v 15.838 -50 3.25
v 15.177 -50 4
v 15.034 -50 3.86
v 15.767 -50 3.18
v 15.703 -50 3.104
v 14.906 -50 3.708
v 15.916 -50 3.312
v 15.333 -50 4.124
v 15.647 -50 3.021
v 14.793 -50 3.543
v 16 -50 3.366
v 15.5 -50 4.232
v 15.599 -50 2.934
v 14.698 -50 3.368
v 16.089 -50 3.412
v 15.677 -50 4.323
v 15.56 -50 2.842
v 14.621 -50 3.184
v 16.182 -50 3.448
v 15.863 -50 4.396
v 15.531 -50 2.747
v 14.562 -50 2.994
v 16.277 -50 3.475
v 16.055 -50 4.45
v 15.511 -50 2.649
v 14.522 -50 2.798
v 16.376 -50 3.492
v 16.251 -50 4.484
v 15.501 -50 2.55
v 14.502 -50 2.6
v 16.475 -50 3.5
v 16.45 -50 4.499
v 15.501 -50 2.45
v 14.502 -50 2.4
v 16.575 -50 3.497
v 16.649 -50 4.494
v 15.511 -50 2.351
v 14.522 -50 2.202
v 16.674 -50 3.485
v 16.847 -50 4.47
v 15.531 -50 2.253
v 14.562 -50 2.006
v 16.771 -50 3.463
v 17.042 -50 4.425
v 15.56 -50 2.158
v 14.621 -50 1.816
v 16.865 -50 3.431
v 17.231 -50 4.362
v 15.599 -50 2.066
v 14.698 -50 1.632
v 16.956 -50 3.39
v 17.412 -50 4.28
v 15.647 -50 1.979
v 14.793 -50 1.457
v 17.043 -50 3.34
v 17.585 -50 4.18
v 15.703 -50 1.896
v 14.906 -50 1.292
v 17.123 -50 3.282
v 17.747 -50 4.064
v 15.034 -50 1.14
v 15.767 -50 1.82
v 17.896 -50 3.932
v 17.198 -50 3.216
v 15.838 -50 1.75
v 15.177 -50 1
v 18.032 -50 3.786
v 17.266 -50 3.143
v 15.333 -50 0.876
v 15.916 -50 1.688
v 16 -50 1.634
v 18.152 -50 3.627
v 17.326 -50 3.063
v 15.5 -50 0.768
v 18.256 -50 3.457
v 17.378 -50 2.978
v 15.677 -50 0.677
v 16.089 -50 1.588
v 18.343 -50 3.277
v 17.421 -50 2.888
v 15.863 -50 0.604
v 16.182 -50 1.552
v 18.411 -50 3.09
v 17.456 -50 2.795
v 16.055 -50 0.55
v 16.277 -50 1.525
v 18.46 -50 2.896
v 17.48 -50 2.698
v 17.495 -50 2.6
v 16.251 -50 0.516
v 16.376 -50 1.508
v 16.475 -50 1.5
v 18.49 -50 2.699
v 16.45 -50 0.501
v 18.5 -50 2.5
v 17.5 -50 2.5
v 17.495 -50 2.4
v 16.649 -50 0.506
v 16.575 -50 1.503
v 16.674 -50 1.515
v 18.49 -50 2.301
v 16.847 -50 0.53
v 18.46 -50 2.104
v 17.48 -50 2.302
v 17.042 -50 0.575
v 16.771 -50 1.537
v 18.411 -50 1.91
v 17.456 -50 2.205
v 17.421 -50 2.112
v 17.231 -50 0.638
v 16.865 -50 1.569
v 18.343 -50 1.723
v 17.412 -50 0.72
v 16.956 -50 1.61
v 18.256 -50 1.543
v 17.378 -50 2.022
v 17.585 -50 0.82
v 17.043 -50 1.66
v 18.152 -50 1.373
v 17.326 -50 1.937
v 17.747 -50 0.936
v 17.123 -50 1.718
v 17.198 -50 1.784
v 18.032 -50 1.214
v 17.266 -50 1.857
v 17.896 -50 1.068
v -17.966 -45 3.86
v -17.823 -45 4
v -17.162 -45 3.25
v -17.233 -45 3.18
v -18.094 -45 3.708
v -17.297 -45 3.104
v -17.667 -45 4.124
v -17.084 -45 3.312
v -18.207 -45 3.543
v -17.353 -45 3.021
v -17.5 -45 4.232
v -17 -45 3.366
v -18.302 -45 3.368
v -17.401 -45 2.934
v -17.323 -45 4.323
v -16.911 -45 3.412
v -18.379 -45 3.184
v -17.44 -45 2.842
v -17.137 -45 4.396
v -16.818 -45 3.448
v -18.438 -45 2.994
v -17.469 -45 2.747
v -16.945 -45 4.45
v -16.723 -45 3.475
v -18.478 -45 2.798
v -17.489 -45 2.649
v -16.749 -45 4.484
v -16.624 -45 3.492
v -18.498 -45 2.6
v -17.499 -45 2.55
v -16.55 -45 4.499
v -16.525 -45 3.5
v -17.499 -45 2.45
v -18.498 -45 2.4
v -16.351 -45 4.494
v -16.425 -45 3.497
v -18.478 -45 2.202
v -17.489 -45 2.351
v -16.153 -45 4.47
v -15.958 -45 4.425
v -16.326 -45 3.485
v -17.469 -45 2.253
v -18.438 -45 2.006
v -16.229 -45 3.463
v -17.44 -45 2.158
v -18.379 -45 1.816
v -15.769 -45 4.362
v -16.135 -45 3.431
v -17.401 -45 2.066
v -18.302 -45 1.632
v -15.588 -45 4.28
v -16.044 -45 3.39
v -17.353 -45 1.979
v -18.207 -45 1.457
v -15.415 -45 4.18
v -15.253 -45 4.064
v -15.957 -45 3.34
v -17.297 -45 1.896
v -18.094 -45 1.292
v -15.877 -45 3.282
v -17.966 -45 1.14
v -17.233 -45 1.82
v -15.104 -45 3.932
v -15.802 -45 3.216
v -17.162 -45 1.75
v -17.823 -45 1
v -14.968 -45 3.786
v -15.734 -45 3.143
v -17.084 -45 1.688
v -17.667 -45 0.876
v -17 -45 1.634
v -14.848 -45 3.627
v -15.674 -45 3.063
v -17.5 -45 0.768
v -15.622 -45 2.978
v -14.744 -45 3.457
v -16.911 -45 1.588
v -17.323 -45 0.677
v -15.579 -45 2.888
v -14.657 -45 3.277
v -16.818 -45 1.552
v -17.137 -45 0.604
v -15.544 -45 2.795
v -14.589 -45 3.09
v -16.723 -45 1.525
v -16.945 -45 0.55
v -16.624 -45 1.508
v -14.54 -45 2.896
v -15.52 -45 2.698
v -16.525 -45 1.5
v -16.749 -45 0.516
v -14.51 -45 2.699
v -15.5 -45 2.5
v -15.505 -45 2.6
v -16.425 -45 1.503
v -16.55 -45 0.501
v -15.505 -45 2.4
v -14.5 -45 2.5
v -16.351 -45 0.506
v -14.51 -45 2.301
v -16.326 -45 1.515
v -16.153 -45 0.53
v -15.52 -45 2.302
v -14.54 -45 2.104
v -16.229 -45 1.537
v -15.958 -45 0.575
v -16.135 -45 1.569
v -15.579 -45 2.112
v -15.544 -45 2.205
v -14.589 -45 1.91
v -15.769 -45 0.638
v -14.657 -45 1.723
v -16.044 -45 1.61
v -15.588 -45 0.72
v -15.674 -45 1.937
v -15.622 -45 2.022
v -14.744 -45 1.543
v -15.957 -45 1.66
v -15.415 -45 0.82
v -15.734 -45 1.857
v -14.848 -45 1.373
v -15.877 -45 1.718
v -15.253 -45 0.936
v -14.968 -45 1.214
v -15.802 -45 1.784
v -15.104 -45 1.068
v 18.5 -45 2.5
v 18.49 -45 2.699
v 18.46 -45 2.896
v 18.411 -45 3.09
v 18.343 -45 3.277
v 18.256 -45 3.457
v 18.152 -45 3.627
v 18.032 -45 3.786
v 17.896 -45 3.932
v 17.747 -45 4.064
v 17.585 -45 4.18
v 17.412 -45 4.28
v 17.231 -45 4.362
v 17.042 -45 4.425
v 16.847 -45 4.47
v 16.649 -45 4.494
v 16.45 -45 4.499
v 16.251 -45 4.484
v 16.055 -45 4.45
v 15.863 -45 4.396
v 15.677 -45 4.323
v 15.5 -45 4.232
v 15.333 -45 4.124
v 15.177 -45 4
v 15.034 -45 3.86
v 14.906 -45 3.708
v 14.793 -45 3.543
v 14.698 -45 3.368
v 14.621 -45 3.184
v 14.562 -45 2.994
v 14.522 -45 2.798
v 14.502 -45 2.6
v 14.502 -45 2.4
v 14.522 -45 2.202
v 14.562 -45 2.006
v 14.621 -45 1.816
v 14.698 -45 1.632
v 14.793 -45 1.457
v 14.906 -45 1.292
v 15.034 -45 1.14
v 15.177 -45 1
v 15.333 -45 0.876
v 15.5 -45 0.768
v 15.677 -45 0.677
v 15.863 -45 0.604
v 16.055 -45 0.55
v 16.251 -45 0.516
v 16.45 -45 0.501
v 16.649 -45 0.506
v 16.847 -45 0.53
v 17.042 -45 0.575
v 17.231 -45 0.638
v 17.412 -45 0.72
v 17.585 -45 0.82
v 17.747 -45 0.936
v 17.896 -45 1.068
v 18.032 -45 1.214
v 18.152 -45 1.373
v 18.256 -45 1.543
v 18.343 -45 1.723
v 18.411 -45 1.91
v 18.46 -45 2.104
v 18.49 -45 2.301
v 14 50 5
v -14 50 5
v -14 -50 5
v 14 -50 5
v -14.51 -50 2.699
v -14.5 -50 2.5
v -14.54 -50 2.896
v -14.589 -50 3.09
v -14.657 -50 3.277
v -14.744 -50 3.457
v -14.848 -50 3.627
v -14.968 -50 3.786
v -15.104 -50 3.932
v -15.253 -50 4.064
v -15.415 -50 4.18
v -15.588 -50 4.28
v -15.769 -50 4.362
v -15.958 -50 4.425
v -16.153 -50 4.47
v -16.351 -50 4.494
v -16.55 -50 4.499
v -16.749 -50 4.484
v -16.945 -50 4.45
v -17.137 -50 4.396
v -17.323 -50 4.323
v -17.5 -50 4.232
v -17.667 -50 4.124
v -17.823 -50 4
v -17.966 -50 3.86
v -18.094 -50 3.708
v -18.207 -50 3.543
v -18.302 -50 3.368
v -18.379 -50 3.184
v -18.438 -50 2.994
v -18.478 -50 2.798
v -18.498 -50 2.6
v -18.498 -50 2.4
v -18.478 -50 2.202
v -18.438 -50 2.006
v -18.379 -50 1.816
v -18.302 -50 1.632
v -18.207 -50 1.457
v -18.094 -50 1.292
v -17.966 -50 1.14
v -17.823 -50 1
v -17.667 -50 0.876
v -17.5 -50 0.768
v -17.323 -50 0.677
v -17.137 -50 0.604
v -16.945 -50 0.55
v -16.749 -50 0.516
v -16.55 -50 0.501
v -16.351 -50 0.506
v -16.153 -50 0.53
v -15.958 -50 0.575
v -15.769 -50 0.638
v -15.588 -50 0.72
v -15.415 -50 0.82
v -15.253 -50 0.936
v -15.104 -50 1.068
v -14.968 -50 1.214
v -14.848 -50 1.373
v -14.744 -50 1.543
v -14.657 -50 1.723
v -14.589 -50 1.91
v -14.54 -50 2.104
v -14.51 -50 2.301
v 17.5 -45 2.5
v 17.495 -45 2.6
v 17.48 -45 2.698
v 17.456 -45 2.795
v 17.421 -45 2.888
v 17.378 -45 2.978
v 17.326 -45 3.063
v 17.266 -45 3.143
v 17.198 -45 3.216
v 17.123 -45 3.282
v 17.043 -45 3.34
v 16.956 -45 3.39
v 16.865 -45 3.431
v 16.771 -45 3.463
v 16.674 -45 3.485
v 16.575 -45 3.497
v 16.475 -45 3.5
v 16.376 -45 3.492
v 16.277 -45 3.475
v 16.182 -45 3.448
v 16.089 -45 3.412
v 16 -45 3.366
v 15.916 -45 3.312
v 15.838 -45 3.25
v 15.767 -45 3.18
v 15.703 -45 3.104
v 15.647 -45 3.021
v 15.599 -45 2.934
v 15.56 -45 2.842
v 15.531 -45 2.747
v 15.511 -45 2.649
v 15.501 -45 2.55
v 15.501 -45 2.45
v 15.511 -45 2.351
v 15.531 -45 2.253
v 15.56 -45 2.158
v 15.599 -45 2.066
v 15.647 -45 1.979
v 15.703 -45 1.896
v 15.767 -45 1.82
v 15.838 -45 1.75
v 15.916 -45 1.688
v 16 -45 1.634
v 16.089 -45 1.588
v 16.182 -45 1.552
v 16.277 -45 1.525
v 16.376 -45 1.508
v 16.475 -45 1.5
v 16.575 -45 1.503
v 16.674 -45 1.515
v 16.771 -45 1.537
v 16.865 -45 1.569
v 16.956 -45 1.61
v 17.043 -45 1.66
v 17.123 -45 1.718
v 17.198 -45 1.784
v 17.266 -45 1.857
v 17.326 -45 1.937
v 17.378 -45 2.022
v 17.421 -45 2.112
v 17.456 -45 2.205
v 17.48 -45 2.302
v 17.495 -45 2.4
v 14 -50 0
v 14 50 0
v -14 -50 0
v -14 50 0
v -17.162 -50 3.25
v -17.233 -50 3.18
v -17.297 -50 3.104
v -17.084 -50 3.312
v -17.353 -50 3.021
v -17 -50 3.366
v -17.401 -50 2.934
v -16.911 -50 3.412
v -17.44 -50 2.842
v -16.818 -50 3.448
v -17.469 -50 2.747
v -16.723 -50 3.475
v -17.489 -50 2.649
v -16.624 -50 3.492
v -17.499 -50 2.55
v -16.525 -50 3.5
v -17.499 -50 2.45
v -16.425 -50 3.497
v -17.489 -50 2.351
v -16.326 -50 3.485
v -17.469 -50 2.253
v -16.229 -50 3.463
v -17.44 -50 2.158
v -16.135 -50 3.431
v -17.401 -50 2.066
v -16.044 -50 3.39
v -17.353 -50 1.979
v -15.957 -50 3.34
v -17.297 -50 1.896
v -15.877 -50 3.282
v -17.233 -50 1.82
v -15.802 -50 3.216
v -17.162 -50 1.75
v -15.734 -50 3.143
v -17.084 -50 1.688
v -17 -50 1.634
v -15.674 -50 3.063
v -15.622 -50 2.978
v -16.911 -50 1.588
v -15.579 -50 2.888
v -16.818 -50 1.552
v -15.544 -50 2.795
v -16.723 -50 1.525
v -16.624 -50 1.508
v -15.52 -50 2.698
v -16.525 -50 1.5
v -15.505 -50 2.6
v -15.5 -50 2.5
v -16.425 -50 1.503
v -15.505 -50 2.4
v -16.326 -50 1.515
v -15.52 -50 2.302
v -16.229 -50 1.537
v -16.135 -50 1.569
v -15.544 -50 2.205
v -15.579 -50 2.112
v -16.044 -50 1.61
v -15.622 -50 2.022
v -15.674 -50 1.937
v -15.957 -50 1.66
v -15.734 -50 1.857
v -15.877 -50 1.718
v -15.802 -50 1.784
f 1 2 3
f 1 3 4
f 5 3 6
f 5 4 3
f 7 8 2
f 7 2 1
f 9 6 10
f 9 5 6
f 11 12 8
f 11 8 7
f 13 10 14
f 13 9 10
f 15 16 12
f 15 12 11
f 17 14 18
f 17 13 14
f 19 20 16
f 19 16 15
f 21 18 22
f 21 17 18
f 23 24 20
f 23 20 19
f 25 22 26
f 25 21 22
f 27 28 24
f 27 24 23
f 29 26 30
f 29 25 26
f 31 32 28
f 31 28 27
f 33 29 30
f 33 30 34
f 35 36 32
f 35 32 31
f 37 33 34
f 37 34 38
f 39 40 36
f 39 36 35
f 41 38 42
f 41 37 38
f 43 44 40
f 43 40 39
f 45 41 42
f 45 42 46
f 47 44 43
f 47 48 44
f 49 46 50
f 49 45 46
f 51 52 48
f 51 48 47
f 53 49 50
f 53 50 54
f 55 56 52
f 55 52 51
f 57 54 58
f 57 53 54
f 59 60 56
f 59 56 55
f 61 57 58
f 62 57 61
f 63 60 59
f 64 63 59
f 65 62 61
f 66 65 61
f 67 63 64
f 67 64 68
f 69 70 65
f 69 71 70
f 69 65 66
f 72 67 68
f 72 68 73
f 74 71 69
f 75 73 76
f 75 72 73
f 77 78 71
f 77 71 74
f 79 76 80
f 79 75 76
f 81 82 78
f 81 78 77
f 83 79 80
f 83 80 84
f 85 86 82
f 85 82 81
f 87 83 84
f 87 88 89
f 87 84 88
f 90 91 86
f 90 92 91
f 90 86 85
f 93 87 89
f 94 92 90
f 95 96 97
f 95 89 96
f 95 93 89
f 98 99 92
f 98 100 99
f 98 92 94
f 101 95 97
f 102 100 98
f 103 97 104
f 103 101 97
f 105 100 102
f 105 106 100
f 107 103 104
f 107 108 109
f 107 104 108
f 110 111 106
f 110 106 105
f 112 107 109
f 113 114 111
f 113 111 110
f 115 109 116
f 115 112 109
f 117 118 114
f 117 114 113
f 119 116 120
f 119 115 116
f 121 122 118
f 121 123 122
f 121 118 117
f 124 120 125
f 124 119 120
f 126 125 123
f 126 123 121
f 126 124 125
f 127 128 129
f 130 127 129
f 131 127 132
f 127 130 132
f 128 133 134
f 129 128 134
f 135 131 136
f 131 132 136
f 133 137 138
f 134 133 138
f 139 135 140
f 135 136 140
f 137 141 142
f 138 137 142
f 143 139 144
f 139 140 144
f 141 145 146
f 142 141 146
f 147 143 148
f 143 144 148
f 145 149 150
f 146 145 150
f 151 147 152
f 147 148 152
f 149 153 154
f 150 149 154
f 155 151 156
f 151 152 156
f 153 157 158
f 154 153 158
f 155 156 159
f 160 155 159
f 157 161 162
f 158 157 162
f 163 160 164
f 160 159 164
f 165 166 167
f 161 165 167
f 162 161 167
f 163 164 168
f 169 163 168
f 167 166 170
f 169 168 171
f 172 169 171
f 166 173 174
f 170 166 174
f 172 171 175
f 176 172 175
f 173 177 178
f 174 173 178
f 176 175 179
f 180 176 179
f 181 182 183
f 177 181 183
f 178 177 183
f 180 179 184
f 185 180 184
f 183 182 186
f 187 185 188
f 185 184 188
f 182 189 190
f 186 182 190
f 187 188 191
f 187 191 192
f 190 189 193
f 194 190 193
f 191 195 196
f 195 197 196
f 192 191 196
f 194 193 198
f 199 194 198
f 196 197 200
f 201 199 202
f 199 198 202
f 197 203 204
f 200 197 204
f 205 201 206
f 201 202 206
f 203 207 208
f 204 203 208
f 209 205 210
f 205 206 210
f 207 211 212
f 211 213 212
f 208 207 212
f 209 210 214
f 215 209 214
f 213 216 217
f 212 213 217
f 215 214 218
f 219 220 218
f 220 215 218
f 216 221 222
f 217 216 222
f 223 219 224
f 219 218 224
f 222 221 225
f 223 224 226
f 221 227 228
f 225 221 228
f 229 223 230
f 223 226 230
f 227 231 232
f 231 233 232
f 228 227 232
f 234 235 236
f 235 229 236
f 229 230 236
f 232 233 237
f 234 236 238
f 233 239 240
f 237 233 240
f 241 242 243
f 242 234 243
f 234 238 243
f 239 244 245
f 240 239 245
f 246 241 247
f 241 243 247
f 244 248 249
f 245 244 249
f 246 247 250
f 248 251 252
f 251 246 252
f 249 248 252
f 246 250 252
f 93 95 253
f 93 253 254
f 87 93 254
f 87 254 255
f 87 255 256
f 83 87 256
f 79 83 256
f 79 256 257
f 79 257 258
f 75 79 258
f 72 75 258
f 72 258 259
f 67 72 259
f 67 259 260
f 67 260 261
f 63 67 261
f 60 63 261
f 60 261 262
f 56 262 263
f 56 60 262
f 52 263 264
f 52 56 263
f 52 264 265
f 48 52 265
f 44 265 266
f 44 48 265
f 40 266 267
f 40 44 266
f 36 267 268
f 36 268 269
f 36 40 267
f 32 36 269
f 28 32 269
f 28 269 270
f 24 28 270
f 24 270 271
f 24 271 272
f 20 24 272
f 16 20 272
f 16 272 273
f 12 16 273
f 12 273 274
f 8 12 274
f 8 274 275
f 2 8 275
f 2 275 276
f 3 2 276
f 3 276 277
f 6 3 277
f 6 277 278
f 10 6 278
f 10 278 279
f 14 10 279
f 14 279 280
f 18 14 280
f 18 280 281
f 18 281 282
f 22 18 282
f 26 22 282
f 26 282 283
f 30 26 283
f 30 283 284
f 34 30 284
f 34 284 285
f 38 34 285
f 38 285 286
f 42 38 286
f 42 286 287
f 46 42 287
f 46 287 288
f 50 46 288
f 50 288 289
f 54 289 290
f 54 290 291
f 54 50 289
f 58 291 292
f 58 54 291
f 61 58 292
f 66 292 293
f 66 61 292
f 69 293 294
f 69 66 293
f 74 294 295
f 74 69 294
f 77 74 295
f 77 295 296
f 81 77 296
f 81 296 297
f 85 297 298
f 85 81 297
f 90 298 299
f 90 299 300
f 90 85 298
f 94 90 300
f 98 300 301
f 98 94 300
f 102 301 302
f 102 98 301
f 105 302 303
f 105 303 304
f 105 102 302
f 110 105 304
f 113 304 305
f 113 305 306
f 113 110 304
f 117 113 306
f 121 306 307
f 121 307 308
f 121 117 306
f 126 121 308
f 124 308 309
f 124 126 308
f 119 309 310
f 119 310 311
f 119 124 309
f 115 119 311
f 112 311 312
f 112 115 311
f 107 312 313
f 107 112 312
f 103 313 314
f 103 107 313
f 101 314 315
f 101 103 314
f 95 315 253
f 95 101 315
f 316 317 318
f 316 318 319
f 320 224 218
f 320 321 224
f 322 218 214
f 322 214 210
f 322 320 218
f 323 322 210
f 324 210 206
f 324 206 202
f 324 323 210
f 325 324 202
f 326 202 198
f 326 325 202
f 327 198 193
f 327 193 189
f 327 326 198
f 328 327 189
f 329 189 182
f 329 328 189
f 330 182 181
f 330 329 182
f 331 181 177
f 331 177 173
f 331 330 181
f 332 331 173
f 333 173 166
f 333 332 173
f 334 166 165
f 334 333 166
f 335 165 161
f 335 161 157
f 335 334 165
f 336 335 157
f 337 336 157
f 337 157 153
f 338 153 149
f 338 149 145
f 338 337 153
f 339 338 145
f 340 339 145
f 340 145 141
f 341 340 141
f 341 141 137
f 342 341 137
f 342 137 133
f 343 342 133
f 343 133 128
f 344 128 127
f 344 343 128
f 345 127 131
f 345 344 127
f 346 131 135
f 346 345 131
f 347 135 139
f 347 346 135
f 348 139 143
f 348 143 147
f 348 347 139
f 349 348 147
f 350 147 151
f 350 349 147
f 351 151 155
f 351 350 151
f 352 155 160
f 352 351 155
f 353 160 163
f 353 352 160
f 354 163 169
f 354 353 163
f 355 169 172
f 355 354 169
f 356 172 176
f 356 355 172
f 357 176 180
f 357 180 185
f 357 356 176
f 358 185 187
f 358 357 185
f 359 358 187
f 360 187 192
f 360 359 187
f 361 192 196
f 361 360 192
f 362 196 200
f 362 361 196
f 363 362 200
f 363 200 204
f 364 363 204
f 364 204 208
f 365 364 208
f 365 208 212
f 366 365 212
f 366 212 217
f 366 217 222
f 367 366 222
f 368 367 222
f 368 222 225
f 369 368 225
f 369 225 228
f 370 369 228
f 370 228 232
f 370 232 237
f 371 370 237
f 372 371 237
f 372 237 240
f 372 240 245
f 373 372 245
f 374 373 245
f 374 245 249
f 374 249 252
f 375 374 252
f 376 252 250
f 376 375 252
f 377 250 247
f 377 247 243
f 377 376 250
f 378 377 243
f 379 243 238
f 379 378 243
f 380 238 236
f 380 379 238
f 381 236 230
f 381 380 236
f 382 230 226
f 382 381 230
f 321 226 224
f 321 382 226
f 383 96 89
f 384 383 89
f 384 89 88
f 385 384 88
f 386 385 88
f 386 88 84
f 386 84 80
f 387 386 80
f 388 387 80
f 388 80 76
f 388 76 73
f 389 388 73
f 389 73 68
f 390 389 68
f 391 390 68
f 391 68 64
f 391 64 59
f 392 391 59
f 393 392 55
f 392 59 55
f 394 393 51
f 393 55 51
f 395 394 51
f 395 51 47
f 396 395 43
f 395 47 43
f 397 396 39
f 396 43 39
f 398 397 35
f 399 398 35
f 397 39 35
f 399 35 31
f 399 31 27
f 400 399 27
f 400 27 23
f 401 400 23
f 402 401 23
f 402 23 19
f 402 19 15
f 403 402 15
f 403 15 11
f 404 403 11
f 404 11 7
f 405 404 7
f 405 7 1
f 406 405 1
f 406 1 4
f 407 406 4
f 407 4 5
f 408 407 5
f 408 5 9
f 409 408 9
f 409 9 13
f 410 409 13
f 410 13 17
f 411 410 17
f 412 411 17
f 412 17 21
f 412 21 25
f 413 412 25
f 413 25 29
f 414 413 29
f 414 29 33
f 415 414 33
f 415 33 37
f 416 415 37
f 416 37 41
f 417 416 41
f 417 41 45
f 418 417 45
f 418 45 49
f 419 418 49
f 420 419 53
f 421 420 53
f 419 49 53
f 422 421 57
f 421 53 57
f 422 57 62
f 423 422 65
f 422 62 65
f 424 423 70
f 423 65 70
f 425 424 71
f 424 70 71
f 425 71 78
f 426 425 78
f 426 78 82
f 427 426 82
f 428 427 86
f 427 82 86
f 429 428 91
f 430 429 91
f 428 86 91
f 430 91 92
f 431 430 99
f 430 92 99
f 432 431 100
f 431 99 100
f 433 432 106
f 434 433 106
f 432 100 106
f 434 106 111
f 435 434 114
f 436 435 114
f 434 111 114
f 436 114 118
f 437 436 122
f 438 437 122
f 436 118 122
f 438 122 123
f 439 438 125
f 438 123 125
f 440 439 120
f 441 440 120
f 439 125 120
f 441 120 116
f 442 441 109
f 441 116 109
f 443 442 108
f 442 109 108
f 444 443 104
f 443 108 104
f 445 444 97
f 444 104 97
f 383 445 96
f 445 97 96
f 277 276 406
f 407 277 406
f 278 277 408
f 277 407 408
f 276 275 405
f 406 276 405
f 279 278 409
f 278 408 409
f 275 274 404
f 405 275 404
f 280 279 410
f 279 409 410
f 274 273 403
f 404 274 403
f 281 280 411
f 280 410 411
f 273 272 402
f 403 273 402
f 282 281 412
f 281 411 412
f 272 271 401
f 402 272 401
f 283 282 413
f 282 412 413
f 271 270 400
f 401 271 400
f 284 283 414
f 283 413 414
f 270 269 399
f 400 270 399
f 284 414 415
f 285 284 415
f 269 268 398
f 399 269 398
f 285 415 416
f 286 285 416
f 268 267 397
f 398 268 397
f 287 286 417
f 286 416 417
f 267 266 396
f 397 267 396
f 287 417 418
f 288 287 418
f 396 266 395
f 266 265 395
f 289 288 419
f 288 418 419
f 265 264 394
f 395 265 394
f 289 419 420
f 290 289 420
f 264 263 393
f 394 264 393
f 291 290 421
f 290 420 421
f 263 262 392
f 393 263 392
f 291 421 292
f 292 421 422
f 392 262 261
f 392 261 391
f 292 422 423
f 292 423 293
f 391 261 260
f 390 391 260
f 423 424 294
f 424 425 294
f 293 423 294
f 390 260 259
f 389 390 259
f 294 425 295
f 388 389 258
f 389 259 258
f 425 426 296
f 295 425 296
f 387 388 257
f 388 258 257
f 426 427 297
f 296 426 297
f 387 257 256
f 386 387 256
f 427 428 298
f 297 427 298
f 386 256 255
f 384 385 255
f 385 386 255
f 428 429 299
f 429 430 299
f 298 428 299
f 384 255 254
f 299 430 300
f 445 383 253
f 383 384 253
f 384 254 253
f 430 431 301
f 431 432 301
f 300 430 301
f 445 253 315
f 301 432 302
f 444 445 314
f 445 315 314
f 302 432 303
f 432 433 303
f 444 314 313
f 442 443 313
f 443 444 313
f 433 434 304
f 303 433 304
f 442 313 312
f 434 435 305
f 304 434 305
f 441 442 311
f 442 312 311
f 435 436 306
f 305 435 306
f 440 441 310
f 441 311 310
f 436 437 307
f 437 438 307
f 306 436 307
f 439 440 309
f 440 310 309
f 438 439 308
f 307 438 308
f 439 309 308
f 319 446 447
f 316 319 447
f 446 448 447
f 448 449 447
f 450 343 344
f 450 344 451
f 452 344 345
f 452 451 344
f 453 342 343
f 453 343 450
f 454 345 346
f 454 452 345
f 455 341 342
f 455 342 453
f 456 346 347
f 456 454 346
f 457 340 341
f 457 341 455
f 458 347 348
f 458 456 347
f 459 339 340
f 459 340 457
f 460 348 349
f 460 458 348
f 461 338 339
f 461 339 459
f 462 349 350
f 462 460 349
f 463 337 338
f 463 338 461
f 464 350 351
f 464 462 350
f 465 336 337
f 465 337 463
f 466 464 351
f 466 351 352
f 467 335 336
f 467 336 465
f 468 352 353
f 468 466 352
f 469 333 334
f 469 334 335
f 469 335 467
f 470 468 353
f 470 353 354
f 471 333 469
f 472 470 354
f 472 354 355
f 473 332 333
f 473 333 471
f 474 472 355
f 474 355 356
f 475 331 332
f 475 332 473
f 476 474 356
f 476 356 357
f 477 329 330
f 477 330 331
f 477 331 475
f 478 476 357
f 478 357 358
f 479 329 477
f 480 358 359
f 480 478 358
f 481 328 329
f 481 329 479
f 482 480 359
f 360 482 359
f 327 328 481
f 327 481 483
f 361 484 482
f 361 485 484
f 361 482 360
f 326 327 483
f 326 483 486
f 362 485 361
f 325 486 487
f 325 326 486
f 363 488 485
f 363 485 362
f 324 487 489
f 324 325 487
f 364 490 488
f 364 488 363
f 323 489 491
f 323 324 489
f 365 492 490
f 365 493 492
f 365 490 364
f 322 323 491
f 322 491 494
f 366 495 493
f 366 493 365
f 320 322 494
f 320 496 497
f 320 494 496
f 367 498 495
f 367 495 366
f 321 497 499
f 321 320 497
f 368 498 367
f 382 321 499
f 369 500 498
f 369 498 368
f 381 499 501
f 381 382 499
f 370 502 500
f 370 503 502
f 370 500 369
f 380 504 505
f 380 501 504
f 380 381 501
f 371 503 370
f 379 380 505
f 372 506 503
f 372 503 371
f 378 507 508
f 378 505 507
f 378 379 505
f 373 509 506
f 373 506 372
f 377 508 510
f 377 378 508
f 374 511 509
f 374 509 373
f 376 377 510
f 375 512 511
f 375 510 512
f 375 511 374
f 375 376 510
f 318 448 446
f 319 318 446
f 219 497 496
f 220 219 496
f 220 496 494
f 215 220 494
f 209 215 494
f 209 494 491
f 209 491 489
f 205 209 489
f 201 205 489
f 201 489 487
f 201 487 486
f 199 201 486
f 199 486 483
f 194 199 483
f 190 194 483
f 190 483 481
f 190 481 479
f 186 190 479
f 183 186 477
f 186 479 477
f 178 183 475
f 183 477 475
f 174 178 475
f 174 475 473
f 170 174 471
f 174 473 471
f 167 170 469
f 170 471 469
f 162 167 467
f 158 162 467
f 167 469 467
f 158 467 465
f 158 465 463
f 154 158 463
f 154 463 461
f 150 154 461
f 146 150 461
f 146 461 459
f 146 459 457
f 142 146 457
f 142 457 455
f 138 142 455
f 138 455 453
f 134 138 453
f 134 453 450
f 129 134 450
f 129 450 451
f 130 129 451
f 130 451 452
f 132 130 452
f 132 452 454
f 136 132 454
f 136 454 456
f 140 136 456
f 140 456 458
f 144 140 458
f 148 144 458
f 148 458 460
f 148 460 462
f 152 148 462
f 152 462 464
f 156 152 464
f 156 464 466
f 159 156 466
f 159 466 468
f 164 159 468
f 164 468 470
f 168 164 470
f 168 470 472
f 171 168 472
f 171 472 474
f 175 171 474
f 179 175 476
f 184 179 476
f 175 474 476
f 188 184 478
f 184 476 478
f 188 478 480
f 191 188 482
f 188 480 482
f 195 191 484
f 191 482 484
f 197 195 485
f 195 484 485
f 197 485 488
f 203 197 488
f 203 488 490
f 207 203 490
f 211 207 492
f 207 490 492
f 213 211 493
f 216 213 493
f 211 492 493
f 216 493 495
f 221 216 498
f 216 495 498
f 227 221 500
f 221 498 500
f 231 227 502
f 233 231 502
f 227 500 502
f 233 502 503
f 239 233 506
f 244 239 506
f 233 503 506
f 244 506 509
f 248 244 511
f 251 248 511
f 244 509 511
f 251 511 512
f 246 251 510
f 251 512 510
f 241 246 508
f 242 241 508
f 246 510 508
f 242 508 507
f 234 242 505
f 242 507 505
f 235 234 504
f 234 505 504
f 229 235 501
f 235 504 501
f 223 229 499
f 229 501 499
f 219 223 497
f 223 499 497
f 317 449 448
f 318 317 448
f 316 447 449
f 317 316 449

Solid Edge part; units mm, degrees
sketch "Sketch1" plane through (0, 0, 0) normal (0, 0, 1) x (1, 0, 0)
  line L0 (14, -50) -> (14, 50)
  line L1 (14, 50) -> (-14, 50)
  line L2 (-14, 50) -> (-14, -50)
  line L3 (-14, -50) -> (14, -50)
extrude "Protrusion1" add sketch "Sketch1" along normal blind 5
sketch "Sketch2" plane through (0, -50, 2.5) normal (0, -1, 0) x (1, 0, 0)
  circle A0 centre (-16.5, 0) radius 2
  circle A1 centre (16.5, 0) radius 2
extrude "ExtrudedProtrusion_3" add sketch "Sketch2" against normal blind 5
sketch "Sketch3" plane through (0, -50, 2.5) normal (0, -1, 0) x (1, 0, 0)
  circle A0 centre (-16.5, 0) radius 1
  circle A1 centre (16.5, 0) radius 1
extrude "ExtrudedCutout_3" cut sketch "Sketch3" against normal blind 71.9388
